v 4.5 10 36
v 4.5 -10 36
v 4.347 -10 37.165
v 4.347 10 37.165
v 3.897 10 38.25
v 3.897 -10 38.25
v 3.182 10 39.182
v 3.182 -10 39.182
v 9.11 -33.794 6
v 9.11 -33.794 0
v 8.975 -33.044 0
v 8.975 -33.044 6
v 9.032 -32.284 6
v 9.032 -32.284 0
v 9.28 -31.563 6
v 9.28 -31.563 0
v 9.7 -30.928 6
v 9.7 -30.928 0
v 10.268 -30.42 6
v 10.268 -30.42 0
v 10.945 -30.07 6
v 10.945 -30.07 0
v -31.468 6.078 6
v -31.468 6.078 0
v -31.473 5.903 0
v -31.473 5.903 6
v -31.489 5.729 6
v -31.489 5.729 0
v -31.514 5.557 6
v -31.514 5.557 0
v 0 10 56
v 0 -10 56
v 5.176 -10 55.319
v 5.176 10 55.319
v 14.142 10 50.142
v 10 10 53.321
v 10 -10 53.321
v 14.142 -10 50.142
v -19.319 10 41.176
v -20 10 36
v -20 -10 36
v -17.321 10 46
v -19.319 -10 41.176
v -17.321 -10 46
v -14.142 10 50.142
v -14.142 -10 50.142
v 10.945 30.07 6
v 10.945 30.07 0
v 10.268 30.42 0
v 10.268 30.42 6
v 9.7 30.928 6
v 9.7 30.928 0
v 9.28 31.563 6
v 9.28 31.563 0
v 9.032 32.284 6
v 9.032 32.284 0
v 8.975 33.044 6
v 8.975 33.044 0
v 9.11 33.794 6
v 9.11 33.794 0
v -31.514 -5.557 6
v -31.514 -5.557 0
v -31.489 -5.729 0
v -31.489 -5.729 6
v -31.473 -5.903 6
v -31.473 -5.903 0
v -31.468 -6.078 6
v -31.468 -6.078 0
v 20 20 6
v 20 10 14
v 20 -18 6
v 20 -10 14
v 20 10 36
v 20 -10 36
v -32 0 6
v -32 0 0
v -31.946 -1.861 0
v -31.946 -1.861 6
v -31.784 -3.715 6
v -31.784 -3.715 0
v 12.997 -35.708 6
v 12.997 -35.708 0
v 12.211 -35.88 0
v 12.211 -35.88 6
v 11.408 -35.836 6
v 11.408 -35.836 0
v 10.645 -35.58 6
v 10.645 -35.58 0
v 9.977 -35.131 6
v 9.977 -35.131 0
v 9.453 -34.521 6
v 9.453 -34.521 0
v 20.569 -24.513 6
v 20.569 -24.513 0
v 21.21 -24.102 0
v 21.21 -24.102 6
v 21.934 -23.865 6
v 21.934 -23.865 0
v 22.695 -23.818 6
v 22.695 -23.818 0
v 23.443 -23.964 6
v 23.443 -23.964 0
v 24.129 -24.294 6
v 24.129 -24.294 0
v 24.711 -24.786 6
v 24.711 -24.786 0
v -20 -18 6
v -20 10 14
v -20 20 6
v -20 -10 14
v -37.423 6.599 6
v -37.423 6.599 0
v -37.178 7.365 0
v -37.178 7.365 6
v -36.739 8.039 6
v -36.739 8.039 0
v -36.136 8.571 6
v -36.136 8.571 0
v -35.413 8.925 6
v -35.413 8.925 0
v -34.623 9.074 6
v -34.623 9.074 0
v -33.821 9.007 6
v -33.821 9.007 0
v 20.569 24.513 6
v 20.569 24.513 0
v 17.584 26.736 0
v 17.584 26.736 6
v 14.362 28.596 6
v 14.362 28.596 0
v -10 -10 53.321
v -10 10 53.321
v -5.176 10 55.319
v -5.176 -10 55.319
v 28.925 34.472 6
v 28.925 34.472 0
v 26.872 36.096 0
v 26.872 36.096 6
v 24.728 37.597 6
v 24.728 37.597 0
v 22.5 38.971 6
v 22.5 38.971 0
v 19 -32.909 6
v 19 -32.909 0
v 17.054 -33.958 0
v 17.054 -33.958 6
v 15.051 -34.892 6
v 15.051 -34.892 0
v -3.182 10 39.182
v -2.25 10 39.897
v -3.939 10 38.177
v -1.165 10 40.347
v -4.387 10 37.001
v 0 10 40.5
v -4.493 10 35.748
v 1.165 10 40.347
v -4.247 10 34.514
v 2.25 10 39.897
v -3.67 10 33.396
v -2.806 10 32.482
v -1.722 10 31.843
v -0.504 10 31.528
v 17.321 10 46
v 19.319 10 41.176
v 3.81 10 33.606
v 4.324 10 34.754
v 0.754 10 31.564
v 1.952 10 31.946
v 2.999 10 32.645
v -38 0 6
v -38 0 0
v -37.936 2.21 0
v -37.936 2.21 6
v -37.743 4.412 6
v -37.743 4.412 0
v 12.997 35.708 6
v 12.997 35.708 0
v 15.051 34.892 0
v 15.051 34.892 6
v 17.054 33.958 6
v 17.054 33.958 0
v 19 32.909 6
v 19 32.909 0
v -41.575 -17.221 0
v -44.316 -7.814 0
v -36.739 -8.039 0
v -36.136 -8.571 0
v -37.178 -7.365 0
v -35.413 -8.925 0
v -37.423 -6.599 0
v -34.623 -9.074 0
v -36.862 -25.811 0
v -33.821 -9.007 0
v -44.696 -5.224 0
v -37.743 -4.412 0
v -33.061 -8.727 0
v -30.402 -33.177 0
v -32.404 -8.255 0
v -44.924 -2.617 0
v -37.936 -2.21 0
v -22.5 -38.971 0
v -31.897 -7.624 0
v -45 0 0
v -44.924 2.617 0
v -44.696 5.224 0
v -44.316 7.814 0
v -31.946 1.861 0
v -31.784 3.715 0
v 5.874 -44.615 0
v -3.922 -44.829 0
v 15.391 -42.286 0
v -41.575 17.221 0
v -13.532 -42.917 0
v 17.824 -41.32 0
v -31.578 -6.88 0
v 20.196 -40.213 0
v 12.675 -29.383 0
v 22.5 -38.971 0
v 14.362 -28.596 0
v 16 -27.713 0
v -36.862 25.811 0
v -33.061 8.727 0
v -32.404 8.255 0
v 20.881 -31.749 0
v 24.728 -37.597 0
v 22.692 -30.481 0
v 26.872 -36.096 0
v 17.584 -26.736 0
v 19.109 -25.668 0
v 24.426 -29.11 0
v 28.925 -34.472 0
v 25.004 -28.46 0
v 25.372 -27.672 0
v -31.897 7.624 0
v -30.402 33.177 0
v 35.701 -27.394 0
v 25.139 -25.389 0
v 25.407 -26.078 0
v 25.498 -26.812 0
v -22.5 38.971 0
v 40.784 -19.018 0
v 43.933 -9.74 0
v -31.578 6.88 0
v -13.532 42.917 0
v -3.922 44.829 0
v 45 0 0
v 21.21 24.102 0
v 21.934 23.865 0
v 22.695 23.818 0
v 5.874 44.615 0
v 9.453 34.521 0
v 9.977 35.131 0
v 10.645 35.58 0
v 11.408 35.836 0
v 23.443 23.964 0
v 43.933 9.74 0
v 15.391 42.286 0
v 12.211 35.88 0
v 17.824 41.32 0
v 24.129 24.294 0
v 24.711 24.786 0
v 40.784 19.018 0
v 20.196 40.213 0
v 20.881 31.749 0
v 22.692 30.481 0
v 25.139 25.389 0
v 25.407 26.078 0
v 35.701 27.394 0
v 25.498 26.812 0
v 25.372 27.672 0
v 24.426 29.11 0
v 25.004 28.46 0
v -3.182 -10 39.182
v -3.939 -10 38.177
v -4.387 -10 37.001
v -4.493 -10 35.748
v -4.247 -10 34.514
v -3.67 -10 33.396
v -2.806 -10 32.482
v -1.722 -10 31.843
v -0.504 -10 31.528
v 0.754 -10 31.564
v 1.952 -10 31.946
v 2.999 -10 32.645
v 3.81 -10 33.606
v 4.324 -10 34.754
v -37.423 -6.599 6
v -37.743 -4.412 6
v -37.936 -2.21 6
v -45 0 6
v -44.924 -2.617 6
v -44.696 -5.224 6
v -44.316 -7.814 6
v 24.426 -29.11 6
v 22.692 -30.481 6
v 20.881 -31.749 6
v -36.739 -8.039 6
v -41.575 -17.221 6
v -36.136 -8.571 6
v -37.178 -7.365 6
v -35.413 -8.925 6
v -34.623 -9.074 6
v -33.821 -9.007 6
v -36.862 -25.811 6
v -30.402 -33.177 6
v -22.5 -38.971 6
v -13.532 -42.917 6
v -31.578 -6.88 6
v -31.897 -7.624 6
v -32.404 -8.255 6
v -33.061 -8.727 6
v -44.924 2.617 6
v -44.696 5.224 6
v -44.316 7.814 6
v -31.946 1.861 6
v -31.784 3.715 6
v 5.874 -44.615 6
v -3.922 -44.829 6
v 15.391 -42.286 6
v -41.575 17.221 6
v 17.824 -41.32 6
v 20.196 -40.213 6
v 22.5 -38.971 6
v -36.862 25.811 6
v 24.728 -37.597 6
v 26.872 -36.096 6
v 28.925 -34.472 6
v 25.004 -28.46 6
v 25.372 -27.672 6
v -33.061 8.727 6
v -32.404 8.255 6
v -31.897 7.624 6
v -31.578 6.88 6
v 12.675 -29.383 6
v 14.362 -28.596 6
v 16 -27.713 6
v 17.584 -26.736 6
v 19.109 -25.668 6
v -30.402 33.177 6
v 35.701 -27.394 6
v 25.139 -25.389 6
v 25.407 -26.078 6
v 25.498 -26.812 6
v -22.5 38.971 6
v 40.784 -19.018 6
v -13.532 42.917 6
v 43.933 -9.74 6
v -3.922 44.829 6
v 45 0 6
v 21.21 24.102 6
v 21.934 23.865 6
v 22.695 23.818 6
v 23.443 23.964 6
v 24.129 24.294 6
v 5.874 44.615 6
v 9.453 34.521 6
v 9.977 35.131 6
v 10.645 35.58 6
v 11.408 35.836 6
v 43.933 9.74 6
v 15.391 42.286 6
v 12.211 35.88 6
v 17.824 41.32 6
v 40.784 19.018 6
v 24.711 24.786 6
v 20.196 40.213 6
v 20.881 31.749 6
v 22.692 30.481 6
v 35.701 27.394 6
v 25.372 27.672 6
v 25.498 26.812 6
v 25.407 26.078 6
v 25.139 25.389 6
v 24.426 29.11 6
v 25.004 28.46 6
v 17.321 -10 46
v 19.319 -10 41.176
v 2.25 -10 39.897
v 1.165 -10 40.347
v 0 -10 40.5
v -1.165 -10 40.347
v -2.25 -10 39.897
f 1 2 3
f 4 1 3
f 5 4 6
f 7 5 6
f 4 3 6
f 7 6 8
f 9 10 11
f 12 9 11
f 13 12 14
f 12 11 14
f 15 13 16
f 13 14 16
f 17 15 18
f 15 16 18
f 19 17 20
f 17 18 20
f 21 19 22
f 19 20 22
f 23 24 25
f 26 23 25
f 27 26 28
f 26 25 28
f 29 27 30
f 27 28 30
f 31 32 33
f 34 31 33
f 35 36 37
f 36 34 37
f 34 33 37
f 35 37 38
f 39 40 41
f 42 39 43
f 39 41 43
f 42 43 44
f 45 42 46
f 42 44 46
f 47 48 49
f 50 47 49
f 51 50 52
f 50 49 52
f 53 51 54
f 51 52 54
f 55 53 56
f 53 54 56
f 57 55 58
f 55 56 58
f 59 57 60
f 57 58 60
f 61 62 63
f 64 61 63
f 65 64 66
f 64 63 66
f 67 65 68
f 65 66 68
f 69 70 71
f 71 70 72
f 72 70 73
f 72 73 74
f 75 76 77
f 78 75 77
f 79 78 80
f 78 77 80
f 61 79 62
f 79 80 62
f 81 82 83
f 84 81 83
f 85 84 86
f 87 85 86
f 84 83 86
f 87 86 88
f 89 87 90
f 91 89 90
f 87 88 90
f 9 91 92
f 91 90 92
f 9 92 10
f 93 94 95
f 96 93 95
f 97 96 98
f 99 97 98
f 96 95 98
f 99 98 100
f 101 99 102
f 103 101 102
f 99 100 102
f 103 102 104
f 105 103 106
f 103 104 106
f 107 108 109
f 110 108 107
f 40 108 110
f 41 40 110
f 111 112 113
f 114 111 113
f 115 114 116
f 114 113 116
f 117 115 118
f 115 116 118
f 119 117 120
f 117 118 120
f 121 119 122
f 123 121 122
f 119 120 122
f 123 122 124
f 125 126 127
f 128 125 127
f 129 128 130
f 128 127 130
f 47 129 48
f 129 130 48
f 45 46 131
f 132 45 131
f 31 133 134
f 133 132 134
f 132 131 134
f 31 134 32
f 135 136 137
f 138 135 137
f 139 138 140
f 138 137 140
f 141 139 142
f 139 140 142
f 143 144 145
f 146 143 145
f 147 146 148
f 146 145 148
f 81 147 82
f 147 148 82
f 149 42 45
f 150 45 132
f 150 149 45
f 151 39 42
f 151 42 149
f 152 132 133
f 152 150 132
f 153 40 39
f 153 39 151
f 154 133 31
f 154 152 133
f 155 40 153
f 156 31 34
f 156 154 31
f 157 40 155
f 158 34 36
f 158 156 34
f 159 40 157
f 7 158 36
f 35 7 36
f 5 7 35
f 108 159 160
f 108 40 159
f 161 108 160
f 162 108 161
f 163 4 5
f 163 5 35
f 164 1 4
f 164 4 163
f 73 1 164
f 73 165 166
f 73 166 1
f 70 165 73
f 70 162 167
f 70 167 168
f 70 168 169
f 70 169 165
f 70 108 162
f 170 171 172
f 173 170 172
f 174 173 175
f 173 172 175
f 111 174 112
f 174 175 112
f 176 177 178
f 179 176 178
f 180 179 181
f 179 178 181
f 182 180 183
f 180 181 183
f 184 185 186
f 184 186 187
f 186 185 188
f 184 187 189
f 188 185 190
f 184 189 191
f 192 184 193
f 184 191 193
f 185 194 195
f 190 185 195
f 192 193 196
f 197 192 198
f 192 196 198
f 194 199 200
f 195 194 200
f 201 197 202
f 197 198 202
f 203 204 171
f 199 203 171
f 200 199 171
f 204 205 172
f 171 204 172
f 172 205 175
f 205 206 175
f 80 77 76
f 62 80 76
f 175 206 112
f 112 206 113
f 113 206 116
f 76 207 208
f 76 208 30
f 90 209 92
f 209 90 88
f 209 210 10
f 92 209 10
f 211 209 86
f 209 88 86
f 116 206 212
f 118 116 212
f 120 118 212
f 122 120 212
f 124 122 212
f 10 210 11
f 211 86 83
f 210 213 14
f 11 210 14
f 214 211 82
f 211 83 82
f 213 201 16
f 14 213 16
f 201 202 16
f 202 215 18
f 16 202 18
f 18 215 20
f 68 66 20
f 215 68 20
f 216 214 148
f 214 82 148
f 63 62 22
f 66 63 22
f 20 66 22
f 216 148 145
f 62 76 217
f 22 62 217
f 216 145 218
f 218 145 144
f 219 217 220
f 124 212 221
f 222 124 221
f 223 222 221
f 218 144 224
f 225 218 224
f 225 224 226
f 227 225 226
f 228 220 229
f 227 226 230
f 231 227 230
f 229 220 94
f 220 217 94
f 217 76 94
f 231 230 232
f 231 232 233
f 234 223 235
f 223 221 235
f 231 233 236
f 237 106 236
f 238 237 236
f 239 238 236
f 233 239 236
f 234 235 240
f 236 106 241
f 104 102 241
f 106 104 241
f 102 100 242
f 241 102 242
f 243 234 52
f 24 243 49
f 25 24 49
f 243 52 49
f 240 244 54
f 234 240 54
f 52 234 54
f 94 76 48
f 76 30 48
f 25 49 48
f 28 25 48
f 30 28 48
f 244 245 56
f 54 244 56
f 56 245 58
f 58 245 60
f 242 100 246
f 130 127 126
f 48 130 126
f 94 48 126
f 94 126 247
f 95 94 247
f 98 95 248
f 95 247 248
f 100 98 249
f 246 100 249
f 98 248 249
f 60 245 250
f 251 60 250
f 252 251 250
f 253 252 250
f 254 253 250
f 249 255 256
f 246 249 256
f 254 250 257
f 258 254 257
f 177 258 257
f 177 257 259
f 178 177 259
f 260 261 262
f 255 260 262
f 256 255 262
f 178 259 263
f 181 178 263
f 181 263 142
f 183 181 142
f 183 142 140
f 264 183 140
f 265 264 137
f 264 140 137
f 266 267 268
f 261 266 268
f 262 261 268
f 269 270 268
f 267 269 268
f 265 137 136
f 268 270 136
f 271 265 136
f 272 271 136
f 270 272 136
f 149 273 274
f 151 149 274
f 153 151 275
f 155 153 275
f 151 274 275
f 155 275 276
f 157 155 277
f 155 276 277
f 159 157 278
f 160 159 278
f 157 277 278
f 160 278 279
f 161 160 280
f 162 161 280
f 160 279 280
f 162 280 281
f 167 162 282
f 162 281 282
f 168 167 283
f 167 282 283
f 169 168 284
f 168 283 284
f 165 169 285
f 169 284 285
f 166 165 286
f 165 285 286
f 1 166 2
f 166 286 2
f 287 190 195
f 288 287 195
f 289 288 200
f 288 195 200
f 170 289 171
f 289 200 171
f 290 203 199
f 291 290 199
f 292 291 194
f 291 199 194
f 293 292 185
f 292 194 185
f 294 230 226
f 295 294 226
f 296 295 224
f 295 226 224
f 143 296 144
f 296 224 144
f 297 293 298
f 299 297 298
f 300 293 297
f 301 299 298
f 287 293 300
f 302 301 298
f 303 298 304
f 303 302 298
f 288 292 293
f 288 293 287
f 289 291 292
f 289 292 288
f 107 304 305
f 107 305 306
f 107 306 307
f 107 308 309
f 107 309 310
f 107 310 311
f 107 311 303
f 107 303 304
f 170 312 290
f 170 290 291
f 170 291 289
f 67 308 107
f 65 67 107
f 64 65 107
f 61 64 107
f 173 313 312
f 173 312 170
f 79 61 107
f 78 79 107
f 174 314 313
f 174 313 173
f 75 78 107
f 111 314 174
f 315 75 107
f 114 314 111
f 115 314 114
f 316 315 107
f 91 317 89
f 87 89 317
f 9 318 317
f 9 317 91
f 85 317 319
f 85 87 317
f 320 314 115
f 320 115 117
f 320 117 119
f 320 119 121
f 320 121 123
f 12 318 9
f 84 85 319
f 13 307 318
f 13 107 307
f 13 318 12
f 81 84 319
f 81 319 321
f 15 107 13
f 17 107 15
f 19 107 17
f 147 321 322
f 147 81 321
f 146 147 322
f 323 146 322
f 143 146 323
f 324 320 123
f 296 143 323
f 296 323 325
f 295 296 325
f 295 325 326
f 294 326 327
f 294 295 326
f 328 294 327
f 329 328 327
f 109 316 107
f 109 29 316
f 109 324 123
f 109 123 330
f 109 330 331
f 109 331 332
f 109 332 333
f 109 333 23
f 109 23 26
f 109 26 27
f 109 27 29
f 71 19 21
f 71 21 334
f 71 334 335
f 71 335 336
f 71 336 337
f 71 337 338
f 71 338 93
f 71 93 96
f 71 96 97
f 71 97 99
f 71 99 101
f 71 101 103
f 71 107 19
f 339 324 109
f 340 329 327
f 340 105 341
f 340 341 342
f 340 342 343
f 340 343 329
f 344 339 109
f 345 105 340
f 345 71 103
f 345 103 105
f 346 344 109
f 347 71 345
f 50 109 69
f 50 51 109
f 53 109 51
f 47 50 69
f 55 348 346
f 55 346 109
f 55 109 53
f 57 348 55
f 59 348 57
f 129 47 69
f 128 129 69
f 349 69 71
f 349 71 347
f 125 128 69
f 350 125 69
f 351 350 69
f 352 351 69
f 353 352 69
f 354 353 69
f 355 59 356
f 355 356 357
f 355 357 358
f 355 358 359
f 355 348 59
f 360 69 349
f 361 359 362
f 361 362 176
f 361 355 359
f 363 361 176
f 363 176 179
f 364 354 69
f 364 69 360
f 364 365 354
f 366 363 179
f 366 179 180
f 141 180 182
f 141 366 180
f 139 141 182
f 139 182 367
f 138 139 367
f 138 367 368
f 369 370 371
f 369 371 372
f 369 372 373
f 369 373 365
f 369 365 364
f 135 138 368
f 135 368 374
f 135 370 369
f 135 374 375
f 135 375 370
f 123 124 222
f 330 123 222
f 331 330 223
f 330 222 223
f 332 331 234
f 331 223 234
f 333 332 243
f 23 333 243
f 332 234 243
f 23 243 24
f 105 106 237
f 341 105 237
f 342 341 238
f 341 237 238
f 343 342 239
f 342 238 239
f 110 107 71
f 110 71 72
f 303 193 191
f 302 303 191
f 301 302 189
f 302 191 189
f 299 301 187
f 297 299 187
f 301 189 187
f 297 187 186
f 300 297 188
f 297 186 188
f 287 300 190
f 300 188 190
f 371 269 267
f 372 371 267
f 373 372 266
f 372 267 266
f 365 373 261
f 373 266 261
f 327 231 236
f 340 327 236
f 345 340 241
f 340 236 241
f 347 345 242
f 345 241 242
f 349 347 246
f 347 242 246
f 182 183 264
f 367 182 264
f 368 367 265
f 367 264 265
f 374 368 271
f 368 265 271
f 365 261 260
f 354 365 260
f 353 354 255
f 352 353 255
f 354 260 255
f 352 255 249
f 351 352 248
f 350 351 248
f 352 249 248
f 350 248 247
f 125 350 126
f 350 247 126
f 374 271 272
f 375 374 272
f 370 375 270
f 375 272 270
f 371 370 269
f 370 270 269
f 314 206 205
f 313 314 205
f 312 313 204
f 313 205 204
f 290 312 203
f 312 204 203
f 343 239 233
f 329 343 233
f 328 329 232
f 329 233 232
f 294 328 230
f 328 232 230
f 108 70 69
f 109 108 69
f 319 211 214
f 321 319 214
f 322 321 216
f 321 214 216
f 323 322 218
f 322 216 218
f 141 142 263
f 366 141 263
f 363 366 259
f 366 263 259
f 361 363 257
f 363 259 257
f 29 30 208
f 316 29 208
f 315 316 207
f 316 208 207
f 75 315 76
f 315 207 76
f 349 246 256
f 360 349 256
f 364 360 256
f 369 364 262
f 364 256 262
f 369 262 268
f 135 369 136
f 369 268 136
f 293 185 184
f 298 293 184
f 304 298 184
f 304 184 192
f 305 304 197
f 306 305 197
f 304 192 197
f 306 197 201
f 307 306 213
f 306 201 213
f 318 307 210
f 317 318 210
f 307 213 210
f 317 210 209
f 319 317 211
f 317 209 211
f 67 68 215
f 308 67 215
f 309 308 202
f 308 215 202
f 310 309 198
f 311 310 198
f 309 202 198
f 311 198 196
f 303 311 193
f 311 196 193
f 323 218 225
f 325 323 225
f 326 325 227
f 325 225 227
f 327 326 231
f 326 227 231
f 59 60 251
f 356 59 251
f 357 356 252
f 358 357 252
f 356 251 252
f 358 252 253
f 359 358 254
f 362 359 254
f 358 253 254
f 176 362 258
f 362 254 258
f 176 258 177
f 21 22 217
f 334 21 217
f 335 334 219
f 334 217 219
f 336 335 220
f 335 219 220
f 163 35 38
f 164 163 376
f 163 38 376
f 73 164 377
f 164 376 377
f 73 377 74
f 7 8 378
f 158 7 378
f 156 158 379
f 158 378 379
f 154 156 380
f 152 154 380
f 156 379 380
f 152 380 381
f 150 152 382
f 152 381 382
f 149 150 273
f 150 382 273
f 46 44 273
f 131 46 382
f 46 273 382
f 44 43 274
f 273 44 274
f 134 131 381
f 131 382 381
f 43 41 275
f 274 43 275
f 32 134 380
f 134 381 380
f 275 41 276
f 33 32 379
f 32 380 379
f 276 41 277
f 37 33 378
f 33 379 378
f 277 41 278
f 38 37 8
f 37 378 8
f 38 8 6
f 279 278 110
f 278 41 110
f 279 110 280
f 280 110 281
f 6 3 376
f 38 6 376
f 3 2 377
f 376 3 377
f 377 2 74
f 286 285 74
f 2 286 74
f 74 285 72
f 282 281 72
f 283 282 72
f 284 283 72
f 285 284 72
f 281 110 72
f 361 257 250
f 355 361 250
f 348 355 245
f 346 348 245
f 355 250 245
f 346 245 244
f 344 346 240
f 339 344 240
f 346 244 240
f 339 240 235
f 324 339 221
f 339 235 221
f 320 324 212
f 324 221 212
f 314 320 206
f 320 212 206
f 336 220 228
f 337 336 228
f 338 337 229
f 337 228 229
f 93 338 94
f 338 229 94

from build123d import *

# Parameters (mm, degrees)
F1_DEPTH = 6
F2_W     = 40
F2_H     = 20
F3_DEPTH = 50
F5_DEPTH = 40
F7_DEPTH = 30
F8_DEPTH = 30


# Not quite as in the source:
# - ends of sketch curves that miss each other by under 0.0002 mm in the source are joined


with BuildPart() as f1:
    # F0 (on Top) → F1 (new body)
    with BuildSketch(Plane.XY):
        with BuildLine():
            ThreePointArc((28.9254424359, -34.4719999404), (40.7838504166, -19.0178217783), (45, 0))
            ThreePointArc((45, 0), (40.7838504166, 19.0178217783), (28.9254424359, 34.4719999404))
            Line((28.9254424359, 34.4719999404), (24.4259291681, 29.1096888385))
            ThreePointArc((24.4259292345, 29.1096887828), (34.4396959257, 16.0594939069), (38, 0))
            ThreePointArc((38, 0), (34.4396959, -16.059493962), (24.4259291412, -29.1096888611))
            Line((24.4259291681, -29.1096888385), (28.9254424359, -34.4719999404))
        make_face()
        with BuildLine():
            ThreePointArc((22.5, -38.9711431703), (25.8109396358, -36.861841993), (28.9254424359, -34.4719999404))
            Line((28.9254424359, -34.4719999404), (24.4259291681, -29.1096888385))
            ThreePointArc((24.4259291412, -29.1096888611), (21.795904567, -31.127777693), (19, -32.9089653438))
            Line((19, -32.9089653438), (22.5, -38.9711431703))
        make_face()
        with BuildLine():
            ThreePointArc((15.3909064497, -42.2861679354), (19.0178217783, -40.7838504166), (22.5, -38.9711431703))
            Line((22.5, -38.9711431703), (19, -32.9089653438))
            ThreePointArc((19, -32.9089653438), (16.0594939837, -34.4396958899), (12.9967655243, -35.7083195615))
            Line((12.9967654464, -35.7083195899), (15.3909064497, -42.2861679354))
        make_face()
        with BuildLine():
            ThreePointArc((-44.3163488855, -7.814167995), (-22.5, -38.9711431703), (15.3909064497, -42.2861679354))
            Line((15.3909064497, -42.2861679354), (12.9967654464, -35.7083195899))
            ThreePointArc((12.9967655243, -35.7083195615), (-18.9999999457, -32.9089653752), (-37.4226946071, -6.5986307931))
            Line((-37.4226946145, -6.5986307513), (-44.3163488855, -7.814167995))
        make_face()
        with BuildLine():
            ThreePointArc((-37.4226946071, -6.5986307931), (-18.9999999457, -32.9089653752), (12.9967655243, -35.7083195615))
            ThreePointArc((12.9967655243, -35.7083195615), (10.6448654939, -35.5803659462), (9.1102432746, -33.7935418013))
            ThreePointArc((9.1102432746, -33.7935418013), (-17.5, -30.3108891325), (-33.8211873211, -9.0070687902))
            ThreePointArc((-33.8211873211, -9.0070687902), (-36.1359334802, -8.5714590704), (-37.4226946071, -6.5986307931))
        make_face()
        with BuildLine():
            ThreePointArc((-33.8211873211, -9.0070687902), (-17.5, -30.3108891325), (9.1102432746, -33.7935418013))
            ThreePointArc((9.1102432746, -33.7935418013), (9.2795808611, -31.5634020763), (10.9446447781, -30.0701637954))
            ThreePointArc((10.9446447781, -30.0701637954), (-15.9999999119, -27.712812972), (-31.5138480965, -5.5567416849))
            ThreePointArc((-31.5138480965, -5.5567416849), (-31.4796872612, -5.8162189899), (-31.4682713554, -6.0776862183))
            ThreePointArc((-31.4682713554, -6.0776862183), (-32.1293344064, -7.956349027), (-33.8211873211, -9.0070687902))
        make_face()
        with BuildLine():
            Line((10.9446445864, -30.0701638651), (0, 0))
            Line((0, 0), (-31.5138480964, -5.5567416853))
            ThreePointArc((-31.5138480964, -5.5567416853), (-15.9999999119, -27.712812972), (10.9446445864, -30.0701638651))
        make_face()
        with BuildLine():
            Line((-31.5138480964, -5.5567416853), (0, 0))
            Line((0, 0), (-32, 0))
            ThreePointArc((-32, 0), (-31.878230339, -2.7889837677), (-31.5138480965, -5.5567416849))
        make_face()
        with BuildLine():
            Line((-32, 0), (0, 0))
            Line((0, 0), (-31.5138480964, 5.5567416853))
            ThreePointArc((-31.5138480966, 5.5567416843), (-31.878230339, 2.7889837674), (-32, 0))
        make_face()
        with BuildLine():
            ThreePointArc((-45, 0), (-44.8287614141, -3.9220084236), (-44.3163488855, -7.814167995))
            Line((-44.3163488855, -7.814167995), (-37.4226946145, -6.5986307513))
            ThreePointArc((-37.4226946071, -6.5986307931), (-37.8553985256, -3.3119182456), (-38, 0))
            Line((-38, 0), (-45, 0))
        make_face()
        with BuildLine():
            Line((-37.4226946145, 6.5986307513), (-44.3163488855, 7.814167995))
            ThreePointArc((-44.3163488855, 7.814167995), (-44.8287614141, 3.9220084236), (-45, 0))
            Line((-45, 0), (-38, 0))
            ThreePointArc((-38, 0), (-37.8553985261, 3.3119182405), (-37.4226946089, 6.5986307831))
        make_face()
        with BuildLine():
            Line((12.9967654464, 35.7083195899), (15.3909064497, 42.2861679354))
            ThreePointArc((15.3909064497, 42.2861679354), (-22.5, 38.9711431703), (-44.3163488855, 7.814167995))
            Line((-44.3163488855, 7.814167995), (-37.4226946145, 6.5986307513))
            ThreePointArc((-37.4226946089, 6.5986307831), (-18.9999999501, 32.9089653726), (12.9967655243, 35.7083195615))
        make_face()
        with BuildLine():
            ThreePointArc((9.1102432746, 33.7935418013), (10.6448654939, 35.5803659462), (12.9967655243, 35.7083195615))
            ThreePointArc((12.9967655243, 35.7083195615), (-18.9999999501, 32.9089653726), (-37.4226946089, 6.5986307831))
            ThreePointArc((-37.4226946089, 6.5986307831), (-36.1359334844, 8.5714590676), (-33.8211873211, 9.0070687902))
            ThreePointArc((-33.8211873211, 9.0070687902), (-17.5, 30.3108891325), (9.1102432746, 33.7935418013))
        make_face()
        with BuildLine():
            Line((-31.5138480964, 5.5567416853), (0, 0))
            Line((0, 0), (10.9446445864, 30.0701638651))
            ThreePointArc((10.9446445864, 30.0701638651), (-15.9999999047, 27.7128129761), (-31.5138480964, 5.5567416853))
        make_face()
        with BuildLine():
            ThreePointArc((10.9446447943, 30.0701637895), (9.2795808649, 31.5634020686), (9.1102432746, 33.7935418013))
            ThreePointArc((9.1102432746, 33.7935418013), (-17.5, 30.3108891325), (-33.8211873211, 9.0070687902))
            ThreePointArc((-33.8211873211, 9.0070687902), (-32.1293344064, 7.956349027), (-31.4682713554, 6.0776862183))
            ThreePointArc((-31.4682713554, 6.0776862183), (-31.4796872612, 5.8162189895), (-31.5138480966, 5.5567416843))
            ThreePointArc((-31.5138480966, 5.5567416843), (-15.9999999047, 27.7128129761), (10.9446447943, 30.0701637895))
        make_face()
        with BuildLine():
            Line((19, 32.9089653438), (22.5, 38.9711431703))
            ThreePointArc((22.5, 38.9711431703), (19.0178217783, 40.7838504166), (15.3909064497, 42.2861679354))
            Line((15.3909064497, 42.2861679354), (12.9967654464, 35.7083195899))
            ThreePointArc((12.9967655243, 35.7083195615), (16.0594939837, 34.4396958899), (19, 32.9089653438))
        make_face()
        with BuildLine():
            Line((24.4259291681, 29.1096888385), (28.9254424359, 34.4719999404))
            ThreePointArc((28.9254424359, 34.4719999404), (25.8109396358, 36.861841993), (22.5, 38.9711431703))
            Line((22.5, 38.9711431703), (19, 32.9089653438))
            ThreePointArc((19, 32.9089653438), (21.7959046168, 31.1277776581), (24.4259292345, 29.1096887828))
        make_face()
        with BuildLine():
            Line((0, 0), (20.56920351, 24.5134221798))
            ThreePointArc((20.5692034907, 24.5134221959), (18.354445953, 26.2128654244), (16, 27.7128129211))
            Line((16, 27.7128129211), (0, 0))
        make_face()
        with BuildLine():
            Line((0, 0), (16, 27.7128129211))
            ThreePointArc((16, 27.7128129211), (13.523784476, 29.0018491384), (10.9446447943, 30.0701637895))
            Line((10.9446447943, 30.0701637895), (0, 0))
        make_face()
        with BuildLine():
            ThreePointArc((32, 0), (29.0018491799, 13.5237843871), (20.5692034907, 24.5134221959))
            Line((20.56920351, 24.5134221798), (0, 0))
            Line((0, 0), (20.56920351, -24.5134221798))
            ThreePointArc((20.5692034979, -24.5134221899), (29.0018491818, -13.5237843828), (32, 0))
        make_face()
        with BuildLine():
            ThreePointArc((16, -27.7128129211), (18.3544459568, -26.2128654218), (20.5692034979, -24.5134221899))
            Line((20.56920351, -24.5134221798), (0, 0))
            Line((0, 0), (16, -27.7128129211))
        make_face()
        with BuildLine():
            Line((16, -27.7128129211), (0, 0))
            Line((0, 0), (10.9446445864, -30.0701638651))
            ThreePointArc((10.9446445864, -30.0701638651), (13.5237844681, -29.0018491421), (16, -27.7128129211))
        make_face()
        with BuildLine():
            ThreePointArc((35, 0), (32.3255552282, 13.4185870786), (24.7109440465, 24.7864730111))
            ThreePointArc((24.7109440465, 24.7864730111), (22.6949176866, 23.8180538062), (20.5692034907, 24.5134221959))
            ThreePointArc((20.5692034907, 24.5134221959), (29.0018491799, 13.5237843871), (32, 0))
            ThreePointArc((32, 0), (29.0018491818, -13.5237843828), (20.5692034979, -24.5134221899))
            ThreePointArc((20.5692034979, -24.5134221899), (22.6949176913, -23.8180538065), (24.7109440465, -24.7864730111))
            ThreePointArc((24.7109440465, -24.7864730111), (32.3255552282, -13.4185870786), (35, 0))
        make_face()
        with BuildLine():
            ThreePointArc((38, 0), (34.4396959257, 16.0594939069), (24.4259292345, 29.1096887828))
            ThreePointArc((24.4259292345, 29.1096887828), (25.2164897185, 28.0794102551), (25.497566339, 26.8115555092))
            ThreePointArc((25.497566339, 26.8115555092), (25.294004531, 25.7253080978), (24.7109440465, 24.7864730111))
            ThreePointArc((24.7109440465, 24.7864730111), (32.3255552282, 13.4185870786), (35, 0))
            ThreePointArc((35, 0), (32.3255552282, -13.4185870786), (24.7109440465, -24.7864730111))
            ThreePointArc((24.7109440465, -24.7864730111), (25.294004531, -25.7253080978), (25.497566339, -26.8115555092))
            ThreePointArc((25.497566339, -26.8115555092), (25.2164896927, -28.0794103103), (24.4259291412, -29.1096888611))
            ThreePointArc((24.4259291412, -29.1096888611), (34.4396959, -16.059493962), (38, 0))
        make_face()
    extrude(amount=F1_DEPTH)

    # F2 (on face) → F3 (join)
    with BuildSketch(Plane.XY.offset(6)):
        Rectangle(F2_W, F2_H)
    extrude(amount=F3_DEPTH)

    # F4 (on face) → F5 (join)
    with BuildSketch(Plane(origin=(-20, 0, 0), x_dir=(0, -1, 0), z_dir=(-1, 0, 0))):
        Polygon((10, 14), (10, 6), (18, 6), align=None)
        Polygon((-10, 14), (-20, 6), (-10, 6), align=None)
    extrude(amount=-F5_DEPTH)

    # F6 (on face) → F7 (cut)
    with BuildSketch(Plane.XZ.offset(10)):
        with BuildLine():
            Line((-14.1421356237, 50.1421356237), (-20, 56))
            Line((-20, 56), (-20, 36))
            ThreePointArc((-20, 36), (-18.4775906502, 43.6536686473), (-14.1421356237, 50.1421356237))
        make_face()
        with BuildLine():
            Line((1.654e-07, 56), (-20, 56))
            Line((-20, 56), (-14.1421356237, 50.1421356237))
            ThreePointArc((-14.1421356237, 50.1421356237), (-7.6536685709, 54.4775906819), (1.654e-07, 56))
        make_face()
        with BuildLine():
            Line((20, 56), (1.654e-07, 56))
            ThreePointArc((1.654e-07, 56), (7.6536687237, 54.4775906186), (14.1421356237, 50.1421356237))
            Line((14.1421356237, 50.1421356237), (20, 56))
        make_face()
        with BuildLine():
            Line((20, 56), (14.1421356237, 50.1421356237))
            ThreePointArc((14.1421356237, 50.1421356237), (18.4775906502, 43.6536686473), (20, 36))
            Line((20, 36), (20, 56))
        make_face()
    extrude(amount=-F7_DEPTH, mode=Mode.SUBTRACT)

    # F6 (on face) → F8 (cut)
    with BuildSketch(Plane.XZ.offset(10)):
        with BuildLine():
            Line((0, 36), (-3.1819805153, 39.1819805153))
            ThreePointArc((-3.1819805153, 39.1819805153), (-1.7220754456, 31.8425421037), (4.5, 36))
            ThreePointArc((4.5, 36), (4.1574578963, 37.7220754456), (3.1819805153, 39.1819805153))
            Line((3.1819805153, 39.1819805153), (0, 36))
        make_face()
        with BuildLine():
            ThreePointArc((3.1819805153, 39.1819805153), (0, 40.5), (-3.1819805153, 39.1819805153))
            Line((-3.1819805153, 39.1819805153), (0, 36))
            Line((0, 36), (3.1819805153, 39.1819805153))
        make_face()
    extrude(amount=-F8_DEPTH, mode=Mode.SUBTRACT)


solid = f1.part
